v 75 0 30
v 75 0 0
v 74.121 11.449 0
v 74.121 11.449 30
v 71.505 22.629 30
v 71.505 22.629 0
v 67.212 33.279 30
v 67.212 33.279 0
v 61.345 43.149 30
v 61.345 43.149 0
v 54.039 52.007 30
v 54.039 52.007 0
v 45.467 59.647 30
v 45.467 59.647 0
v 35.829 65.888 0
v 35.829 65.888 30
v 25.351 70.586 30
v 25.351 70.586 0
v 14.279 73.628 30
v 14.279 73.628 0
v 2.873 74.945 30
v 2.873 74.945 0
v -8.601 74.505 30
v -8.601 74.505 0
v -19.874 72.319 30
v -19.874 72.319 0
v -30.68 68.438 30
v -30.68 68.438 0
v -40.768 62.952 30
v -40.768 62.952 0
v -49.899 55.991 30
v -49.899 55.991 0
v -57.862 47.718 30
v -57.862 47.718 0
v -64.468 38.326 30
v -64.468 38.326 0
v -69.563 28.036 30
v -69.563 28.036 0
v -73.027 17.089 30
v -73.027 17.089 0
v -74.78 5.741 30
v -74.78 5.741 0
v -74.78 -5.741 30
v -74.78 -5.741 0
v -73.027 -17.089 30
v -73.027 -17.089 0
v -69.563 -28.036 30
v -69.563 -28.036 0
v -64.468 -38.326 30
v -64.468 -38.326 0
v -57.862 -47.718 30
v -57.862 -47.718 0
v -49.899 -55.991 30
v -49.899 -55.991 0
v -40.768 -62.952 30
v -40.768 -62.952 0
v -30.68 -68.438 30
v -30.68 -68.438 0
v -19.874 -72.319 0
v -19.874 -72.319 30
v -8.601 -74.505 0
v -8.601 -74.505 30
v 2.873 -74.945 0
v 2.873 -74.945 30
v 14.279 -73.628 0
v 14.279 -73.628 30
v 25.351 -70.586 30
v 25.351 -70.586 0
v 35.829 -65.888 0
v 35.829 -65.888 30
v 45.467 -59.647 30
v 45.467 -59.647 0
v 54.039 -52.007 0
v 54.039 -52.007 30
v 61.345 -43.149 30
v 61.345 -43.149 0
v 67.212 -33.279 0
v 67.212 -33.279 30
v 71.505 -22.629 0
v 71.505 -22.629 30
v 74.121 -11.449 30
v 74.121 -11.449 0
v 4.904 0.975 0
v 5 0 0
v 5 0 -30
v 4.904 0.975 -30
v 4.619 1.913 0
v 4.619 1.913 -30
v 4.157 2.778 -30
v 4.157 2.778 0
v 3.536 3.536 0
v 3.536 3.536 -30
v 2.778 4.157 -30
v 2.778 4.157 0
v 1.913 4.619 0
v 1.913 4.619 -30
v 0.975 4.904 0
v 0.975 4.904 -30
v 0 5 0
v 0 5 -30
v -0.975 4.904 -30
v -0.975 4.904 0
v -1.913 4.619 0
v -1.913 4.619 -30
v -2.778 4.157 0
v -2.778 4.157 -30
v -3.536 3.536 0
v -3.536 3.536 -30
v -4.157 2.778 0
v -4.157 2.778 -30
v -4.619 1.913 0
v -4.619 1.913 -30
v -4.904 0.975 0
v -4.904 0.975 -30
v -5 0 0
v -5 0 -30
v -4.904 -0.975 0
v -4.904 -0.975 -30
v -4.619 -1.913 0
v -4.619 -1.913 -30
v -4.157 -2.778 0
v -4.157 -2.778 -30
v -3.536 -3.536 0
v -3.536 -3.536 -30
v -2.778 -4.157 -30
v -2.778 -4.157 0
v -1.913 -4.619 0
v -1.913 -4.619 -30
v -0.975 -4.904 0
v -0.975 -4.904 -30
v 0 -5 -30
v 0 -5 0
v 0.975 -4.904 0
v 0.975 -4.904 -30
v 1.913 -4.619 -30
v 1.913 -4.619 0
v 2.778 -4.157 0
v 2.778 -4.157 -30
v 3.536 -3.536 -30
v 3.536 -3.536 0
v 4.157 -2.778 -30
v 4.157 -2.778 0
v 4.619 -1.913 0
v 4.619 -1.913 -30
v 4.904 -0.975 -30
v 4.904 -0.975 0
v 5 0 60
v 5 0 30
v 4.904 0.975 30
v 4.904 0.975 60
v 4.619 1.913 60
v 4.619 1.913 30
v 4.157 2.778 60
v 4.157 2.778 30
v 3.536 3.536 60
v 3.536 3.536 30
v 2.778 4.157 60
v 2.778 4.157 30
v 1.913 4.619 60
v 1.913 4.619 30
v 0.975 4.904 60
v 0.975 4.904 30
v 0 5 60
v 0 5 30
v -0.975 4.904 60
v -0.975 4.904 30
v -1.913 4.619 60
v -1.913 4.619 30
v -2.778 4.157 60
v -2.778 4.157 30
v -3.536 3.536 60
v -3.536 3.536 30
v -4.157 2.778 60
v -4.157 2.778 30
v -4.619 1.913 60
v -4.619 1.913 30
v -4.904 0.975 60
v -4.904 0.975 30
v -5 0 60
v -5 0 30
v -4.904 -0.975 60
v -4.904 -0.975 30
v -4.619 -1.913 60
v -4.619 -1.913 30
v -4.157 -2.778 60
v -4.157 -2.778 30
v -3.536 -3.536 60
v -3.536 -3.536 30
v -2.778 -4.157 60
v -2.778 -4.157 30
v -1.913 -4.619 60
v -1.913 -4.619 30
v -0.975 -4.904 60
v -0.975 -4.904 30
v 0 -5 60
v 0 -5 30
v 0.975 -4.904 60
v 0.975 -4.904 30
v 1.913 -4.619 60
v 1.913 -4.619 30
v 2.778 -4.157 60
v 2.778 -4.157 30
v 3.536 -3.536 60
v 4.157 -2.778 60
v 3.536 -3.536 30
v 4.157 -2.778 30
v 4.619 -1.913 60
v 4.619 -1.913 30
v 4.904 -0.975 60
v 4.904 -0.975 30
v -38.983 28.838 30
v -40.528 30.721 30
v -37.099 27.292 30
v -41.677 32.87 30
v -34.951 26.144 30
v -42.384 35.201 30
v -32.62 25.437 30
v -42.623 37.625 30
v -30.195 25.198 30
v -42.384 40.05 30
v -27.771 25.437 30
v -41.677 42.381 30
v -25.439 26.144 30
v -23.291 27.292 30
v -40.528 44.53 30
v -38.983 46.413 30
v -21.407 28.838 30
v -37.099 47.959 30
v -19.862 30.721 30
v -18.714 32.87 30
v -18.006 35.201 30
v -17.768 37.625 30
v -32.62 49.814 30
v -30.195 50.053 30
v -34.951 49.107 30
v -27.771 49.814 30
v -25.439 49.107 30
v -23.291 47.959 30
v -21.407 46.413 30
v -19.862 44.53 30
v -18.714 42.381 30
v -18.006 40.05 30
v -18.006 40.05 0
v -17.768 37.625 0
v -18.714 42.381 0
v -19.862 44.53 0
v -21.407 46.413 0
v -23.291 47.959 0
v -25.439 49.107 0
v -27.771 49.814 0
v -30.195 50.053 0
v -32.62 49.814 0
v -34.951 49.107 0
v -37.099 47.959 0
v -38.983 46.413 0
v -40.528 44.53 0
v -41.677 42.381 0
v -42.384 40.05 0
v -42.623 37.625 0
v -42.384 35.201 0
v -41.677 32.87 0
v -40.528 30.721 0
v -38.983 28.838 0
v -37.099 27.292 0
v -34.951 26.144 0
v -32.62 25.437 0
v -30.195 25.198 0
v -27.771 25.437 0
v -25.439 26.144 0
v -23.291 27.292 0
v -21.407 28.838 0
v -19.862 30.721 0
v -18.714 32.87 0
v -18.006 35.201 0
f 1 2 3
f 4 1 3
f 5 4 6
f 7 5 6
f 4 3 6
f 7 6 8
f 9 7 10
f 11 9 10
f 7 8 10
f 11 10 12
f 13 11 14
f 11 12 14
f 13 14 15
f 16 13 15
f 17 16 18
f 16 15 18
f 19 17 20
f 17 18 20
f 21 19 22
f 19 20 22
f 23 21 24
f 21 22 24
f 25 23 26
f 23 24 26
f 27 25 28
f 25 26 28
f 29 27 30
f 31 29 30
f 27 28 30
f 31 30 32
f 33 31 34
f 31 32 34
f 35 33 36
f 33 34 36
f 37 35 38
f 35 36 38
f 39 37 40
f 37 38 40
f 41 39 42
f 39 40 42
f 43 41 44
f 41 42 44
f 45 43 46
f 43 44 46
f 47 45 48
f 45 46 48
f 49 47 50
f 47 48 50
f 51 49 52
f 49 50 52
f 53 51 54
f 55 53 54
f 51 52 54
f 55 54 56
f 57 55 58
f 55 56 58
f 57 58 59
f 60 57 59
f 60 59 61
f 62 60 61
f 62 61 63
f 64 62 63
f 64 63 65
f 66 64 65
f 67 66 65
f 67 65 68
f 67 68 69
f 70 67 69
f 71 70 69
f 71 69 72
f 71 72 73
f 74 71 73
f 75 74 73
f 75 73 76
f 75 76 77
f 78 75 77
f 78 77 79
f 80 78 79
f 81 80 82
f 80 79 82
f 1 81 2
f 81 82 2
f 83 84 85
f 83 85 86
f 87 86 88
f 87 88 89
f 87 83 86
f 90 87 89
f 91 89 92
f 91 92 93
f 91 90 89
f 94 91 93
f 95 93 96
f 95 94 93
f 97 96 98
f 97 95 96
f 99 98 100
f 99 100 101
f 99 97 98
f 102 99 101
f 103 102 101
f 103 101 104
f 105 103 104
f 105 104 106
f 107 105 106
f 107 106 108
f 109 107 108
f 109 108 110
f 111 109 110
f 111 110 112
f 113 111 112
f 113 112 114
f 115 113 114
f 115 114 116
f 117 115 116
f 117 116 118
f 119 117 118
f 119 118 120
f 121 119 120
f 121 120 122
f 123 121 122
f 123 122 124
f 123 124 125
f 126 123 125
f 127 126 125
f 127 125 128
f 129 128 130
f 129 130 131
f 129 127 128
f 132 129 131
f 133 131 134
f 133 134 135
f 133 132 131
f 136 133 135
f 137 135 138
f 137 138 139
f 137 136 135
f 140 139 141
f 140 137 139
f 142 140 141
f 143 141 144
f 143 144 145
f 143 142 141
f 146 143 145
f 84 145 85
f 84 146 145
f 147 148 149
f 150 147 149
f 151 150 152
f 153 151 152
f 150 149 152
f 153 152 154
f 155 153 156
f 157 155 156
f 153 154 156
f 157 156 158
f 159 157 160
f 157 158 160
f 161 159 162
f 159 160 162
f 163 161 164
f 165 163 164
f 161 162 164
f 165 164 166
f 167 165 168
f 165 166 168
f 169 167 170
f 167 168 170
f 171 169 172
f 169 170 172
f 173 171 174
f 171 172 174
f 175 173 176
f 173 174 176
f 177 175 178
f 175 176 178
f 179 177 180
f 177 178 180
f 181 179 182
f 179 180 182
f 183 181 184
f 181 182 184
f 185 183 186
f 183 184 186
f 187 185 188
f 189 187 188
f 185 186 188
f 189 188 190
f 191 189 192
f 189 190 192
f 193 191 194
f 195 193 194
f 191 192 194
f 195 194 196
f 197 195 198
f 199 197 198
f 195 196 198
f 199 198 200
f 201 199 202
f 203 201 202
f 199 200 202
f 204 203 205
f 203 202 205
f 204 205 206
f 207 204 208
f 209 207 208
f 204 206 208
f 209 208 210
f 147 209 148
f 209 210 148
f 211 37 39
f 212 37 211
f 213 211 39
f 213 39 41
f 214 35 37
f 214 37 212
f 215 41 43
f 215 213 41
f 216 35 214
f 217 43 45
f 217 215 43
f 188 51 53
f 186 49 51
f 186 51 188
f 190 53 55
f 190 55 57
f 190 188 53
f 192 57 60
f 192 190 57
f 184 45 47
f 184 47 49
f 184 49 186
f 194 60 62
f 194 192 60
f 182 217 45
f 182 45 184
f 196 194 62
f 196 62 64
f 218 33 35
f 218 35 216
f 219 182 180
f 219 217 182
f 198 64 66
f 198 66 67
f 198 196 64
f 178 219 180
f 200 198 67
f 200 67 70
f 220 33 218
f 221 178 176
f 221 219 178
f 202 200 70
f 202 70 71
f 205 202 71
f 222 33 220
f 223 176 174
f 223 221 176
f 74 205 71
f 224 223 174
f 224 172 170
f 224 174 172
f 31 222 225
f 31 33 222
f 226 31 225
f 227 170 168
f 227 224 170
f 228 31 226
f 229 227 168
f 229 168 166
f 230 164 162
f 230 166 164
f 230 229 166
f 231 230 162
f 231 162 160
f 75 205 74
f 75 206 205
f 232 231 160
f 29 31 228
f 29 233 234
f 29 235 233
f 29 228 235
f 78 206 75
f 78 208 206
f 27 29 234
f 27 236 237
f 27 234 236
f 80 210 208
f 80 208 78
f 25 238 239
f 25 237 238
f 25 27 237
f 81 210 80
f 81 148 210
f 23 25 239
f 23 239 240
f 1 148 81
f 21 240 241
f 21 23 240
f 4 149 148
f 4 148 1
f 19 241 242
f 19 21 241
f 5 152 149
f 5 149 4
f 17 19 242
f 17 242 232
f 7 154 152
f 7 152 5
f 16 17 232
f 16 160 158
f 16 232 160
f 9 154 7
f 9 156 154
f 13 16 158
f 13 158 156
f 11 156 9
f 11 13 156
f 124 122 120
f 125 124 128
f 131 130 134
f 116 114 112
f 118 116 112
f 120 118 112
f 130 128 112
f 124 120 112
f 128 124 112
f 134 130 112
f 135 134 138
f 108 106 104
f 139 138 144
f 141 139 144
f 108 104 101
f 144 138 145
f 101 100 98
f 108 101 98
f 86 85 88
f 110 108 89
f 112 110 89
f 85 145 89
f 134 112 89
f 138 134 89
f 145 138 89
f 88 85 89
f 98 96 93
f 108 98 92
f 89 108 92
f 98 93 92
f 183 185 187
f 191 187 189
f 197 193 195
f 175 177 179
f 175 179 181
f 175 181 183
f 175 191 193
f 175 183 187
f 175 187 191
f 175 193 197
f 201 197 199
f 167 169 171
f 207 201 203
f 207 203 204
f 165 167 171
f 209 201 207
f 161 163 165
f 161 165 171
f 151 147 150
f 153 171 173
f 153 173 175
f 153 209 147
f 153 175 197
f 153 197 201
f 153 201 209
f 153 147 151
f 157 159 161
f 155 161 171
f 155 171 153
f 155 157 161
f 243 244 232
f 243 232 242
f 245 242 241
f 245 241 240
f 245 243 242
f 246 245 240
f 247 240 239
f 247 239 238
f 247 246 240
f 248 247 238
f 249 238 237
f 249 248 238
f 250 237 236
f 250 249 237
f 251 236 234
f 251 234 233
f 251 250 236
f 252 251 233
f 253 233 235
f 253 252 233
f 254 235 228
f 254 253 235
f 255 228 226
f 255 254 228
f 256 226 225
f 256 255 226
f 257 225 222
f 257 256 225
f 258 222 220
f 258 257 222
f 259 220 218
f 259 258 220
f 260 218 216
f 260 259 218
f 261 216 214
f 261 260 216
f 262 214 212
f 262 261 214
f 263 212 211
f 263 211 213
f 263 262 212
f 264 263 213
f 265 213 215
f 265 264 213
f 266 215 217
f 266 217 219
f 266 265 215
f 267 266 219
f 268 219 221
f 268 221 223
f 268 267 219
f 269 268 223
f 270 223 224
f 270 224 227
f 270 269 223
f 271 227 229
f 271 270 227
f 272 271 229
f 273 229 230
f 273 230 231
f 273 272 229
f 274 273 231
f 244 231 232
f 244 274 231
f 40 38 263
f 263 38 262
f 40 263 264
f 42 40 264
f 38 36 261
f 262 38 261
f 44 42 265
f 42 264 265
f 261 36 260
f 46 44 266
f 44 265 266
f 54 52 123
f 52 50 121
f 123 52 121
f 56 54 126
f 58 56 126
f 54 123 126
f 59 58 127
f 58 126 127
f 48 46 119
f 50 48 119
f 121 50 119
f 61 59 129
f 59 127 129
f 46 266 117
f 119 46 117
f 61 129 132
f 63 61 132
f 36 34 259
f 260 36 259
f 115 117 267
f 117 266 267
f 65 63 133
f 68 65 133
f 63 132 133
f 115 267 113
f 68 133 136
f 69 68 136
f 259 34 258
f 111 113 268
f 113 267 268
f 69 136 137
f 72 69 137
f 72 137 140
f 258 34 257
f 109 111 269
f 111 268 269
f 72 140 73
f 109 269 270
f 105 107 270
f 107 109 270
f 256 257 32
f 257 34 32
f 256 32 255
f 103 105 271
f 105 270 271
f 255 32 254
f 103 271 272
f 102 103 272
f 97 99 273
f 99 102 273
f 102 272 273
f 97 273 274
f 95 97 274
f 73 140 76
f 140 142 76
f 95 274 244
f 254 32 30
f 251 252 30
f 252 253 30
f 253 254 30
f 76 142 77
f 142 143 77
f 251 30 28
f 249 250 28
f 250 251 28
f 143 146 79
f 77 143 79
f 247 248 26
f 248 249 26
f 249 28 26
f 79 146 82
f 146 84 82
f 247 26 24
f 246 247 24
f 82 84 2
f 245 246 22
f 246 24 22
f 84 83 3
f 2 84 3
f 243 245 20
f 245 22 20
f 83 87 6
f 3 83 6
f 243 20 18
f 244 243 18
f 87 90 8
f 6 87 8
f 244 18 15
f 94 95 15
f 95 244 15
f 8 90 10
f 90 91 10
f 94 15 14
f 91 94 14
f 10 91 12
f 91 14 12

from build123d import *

# Parameters (mm, degrees)
SKETCH_1_R           = 75
SKETCH_1_R_2         = 5
SKETCH_1_R_3         = 12.427488399
EXTRUDE_1_DEPTH      = 30
SKETCH_2_R           = 5
EXTRUDE_2_DEPTH      = 30
EXTRUDE_2_DEPTH_BACK = 60


with BuildPart() as part:
    # 草图1 → 凸台-拉伸1 (new body)
    with BuildSketch(Plane.XY):
        Circle(SKETCH_1_R)
        Circle(SKETCH_1_R_2, mode=Mode.SUBTRACT)
        with Locations((-30.195035009, 37.625475503)):
            Circle(SKETCH_1_R_3, mode=Mode.SUBTRACT)
    extrude(amount=EXTRUDE_1_DEPTH)

    # 草图2 → 凸台-拉伸2 (add, two sides)
    with BuildSketch(Plane.XY.offset(30)) as extrude_2_sk:
        Circle(SKETCH_2_R)
    extrude(amount=EXTRUDE_2_DEPTH)
    extrude(extrude_2_sk.sketch, amount=-EXTRUDE_2_DEPTH_BACK)


solid = part.part
